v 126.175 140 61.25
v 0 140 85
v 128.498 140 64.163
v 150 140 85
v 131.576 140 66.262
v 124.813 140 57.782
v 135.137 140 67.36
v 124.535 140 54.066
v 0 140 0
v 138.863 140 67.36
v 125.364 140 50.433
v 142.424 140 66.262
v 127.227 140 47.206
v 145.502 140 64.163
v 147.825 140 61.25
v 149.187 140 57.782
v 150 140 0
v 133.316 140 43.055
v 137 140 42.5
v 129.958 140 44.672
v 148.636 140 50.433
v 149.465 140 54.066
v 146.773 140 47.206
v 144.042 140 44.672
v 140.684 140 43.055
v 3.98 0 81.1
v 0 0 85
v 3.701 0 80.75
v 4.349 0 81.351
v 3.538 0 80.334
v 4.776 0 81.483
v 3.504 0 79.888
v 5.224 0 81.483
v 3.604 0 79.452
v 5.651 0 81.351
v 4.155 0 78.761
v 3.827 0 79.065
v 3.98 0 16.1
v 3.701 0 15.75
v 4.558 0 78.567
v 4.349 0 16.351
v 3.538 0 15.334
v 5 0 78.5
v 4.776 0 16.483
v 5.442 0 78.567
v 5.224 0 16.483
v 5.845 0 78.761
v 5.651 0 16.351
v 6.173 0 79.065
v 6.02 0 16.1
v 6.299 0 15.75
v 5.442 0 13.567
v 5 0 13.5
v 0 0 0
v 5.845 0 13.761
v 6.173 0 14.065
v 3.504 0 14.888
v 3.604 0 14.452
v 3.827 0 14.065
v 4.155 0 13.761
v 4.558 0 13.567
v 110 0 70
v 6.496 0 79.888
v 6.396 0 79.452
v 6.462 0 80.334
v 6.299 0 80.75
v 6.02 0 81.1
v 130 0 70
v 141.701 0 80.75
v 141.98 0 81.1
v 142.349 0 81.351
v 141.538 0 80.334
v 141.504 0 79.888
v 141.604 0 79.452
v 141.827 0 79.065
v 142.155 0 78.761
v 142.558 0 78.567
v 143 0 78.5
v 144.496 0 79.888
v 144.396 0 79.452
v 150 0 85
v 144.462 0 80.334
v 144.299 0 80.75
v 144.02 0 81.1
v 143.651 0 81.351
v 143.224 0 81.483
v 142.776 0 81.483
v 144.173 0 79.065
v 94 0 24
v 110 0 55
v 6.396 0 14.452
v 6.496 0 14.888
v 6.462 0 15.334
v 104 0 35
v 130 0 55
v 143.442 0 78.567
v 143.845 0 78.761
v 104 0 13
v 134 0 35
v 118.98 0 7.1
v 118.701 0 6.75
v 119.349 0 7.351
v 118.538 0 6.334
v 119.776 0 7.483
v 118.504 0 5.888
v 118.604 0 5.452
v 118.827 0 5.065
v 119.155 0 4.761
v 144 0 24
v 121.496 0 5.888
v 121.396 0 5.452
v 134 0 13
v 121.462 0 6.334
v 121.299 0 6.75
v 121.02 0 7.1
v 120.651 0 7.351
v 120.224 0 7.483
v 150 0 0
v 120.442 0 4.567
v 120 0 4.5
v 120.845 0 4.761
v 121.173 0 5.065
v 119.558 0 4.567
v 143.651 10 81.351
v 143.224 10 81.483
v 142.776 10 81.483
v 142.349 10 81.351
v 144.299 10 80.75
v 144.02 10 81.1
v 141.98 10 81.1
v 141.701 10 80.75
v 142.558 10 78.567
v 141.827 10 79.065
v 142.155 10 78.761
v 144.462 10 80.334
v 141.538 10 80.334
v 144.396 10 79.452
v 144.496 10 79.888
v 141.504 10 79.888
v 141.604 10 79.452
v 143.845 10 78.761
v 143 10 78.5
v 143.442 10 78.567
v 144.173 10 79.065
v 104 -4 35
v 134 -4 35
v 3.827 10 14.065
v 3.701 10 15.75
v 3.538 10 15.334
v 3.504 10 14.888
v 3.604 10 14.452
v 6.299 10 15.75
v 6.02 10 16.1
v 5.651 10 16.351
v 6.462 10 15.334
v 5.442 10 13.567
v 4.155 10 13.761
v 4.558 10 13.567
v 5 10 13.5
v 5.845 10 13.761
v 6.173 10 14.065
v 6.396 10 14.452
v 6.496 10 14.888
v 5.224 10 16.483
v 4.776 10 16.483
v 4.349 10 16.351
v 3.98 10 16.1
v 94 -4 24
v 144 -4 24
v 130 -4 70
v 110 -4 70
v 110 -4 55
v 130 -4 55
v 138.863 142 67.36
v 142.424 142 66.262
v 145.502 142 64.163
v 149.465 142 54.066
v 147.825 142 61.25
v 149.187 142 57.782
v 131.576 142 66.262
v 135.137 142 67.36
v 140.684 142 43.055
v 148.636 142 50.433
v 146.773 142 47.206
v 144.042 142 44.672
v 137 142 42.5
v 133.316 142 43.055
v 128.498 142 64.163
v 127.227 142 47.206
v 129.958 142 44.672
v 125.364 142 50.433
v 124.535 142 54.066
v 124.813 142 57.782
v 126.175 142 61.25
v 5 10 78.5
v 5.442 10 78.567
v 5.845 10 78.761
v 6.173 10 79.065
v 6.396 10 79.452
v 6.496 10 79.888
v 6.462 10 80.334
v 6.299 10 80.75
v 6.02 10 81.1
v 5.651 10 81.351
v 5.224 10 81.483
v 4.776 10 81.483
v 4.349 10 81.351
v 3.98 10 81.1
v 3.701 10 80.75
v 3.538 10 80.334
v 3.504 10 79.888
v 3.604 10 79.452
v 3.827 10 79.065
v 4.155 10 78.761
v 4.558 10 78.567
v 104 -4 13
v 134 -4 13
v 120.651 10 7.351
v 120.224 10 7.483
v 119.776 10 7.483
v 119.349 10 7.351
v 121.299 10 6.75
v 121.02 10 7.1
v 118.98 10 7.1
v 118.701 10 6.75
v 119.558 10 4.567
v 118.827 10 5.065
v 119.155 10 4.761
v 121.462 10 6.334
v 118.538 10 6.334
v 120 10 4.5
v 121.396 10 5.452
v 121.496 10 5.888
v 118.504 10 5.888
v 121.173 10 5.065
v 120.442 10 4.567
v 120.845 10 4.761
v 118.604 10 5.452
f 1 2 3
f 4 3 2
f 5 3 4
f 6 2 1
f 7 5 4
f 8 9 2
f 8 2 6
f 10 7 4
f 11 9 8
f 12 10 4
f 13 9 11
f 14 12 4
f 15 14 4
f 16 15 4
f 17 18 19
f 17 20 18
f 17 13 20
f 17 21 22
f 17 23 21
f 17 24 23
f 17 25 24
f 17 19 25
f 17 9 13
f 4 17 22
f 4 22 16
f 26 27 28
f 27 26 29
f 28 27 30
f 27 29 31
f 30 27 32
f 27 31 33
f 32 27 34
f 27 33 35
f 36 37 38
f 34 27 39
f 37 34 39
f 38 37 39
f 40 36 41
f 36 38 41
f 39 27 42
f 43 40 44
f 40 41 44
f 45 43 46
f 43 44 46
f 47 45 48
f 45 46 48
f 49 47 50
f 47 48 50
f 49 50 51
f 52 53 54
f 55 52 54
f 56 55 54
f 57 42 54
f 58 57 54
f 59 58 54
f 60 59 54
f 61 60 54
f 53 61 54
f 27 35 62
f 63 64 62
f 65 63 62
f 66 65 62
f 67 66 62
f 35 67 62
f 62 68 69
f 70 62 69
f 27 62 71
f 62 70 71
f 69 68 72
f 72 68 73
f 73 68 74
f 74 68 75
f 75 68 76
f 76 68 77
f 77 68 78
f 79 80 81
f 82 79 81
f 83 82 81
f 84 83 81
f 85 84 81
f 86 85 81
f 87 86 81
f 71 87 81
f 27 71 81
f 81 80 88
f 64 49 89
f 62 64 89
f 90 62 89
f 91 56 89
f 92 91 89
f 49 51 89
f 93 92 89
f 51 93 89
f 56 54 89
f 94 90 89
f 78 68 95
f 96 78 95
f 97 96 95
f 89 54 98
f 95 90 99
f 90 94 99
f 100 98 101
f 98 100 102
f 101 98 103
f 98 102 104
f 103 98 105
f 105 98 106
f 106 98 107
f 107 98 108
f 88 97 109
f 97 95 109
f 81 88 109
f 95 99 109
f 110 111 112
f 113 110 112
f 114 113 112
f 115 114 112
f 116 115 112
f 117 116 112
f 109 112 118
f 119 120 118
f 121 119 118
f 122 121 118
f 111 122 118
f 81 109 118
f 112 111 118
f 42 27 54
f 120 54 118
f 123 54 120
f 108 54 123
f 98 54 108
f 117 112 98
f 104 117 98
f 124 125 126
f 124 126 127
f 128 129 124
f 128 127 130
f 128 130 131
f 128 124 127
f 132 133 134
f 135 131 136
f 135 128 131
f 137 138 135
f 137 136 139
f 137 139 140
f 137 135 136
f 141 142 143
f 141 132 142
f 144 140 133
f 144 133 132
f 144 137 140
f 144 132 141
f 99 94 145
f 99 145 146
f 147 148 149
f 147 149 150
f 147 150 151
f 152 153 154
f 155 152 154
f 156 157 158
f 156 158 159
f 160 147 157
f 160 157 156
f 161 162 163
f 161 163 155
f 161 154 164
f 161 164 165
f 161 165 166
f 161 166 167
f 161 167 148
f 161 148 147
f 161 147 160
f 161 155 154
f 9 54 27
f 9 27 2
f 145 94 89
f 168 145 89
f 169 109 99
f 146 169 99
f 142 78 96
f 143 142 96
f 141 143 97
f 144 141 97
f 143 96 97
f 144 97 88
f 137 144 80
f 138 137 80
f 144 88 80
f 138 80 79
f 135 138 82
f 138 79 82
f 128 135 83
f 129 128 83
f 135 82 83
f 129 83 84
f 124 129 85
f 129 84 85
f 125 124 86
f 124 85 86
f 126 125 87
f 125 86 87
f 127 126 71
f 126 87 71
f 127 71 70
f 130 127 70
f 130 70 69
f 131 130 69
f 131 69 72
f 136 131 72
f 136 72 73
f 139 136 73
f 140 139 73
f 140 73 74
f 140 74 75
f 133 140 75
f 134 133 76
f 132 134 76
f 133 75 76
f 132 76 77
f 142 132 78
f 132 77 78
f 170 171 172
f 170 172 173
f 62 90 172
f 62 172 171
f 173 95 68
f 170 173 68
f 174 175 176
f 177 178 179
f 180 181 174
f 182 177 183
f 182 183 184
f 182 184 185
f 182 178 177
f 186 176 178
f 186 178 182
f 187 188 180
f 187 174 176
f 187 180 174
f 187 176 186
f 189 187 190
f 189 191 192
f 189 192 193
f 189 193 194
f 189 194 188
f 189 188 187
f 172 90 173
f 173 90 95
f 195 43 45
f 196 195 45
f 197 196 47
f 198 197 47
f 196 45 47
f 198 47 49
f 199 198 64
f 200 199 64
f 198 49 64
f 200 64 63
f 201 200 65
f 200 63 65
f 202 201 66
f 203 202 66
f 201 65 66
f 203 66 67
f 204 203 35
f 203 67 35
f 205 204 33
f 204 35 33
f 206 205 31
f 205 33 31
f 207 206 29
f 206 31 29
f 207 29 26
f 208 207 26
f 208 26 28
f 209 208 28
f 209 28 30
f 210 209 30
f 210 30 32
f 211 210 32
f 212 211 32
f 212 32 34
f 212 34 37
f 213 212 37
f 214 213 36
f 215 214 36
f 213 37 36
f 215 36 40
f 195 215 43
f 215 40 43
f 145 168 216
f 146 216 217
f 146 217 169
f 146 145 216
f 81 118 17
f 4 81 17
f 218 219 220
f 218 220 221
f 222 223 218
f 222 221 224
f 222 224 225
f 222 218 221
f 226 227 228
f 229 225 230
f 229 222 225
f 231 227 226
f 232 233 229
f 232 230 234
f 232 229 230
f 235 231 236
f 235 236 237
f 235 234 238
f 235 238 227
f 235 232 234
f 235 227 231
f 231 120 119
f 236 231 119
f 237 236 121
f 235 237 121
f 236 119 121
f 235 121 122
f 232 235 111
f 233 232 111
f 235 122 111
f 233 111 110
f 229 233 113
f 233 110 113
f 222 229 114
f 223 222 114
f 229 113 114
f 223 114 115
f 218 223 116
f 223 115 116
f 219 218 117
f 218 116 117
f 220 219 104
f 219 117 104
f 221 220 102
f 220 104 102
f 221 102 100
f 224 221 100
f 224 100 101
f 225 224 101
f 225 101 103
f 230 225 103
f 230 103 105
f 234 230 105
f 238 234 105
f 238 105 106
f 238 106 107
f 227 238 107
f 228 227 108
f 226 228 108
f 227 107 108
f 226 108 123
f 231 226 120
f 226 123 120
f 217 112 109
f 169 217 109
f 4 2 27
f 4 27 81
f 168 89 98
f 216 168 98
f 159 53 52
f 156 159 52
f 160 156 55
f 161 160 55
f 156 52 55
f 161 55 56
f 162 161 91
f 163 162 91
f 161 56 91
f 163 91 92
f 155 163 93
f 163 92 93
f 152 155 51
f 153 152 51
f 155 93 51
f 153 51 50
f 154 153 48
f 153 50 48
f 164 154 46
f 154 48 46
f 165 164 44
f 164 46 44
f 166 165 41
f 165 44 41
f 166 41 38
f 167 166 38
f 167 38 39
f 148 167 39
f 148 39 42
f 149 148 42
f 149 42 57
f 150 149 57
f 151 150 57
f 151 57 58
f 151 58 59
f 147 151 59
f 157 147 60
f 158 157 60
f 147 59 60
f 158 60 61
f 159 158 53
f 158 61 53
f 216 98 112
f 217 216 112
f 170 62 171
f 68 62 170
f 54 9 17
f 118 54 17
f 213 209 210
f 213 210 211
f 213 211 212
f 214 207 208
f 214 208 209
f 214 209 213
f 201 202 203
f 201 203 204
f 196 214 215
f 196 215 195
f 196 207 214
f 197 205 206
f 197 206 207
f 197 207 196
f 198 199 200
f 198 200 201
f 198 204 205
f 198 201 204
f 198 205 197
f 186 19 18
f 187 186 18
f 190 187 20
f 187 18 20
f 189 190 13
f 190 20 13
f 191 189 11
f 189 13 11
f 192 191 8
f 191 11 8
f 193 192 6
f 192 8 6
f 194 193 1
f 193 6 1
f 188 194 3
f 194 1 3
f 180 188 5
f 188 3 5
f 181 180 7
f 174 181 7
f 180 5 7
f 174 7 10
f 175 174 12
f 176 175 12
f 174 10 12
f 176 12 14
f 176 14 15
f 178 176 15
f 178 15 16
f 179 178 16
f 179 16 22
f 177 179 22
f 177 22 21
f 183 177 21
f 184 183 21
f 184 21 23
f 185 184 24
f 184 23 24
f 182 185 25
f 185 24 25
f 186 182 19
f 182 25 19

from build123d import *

# Parameters (mm, degrees)
SCHIZZO1_W                   = 150
SCHIZZO1_H                   = 140
ESTRUSIONE_ESTRUSIONE1_DEPTH = 85
SCHIZZO2_W                   = 20
SCHIZZO2_H                   = 15
SCHIZZO2_W_2                 = 30
SCHIZZO2_H_2                 = 11
ESTRUSIONE_ESTRUSIONE2_DEPTH = 4
SCHIZZO3_R                   = 1.5
TAGLIO_ESTRUSIONE1_DEPTH     = 10
SCHIZZO4_R                   = 12.5
ESTRUSIONE_ESTRUSIONE3_DEPTH = 2


with BuildPart() as part:
    # Schizzo1 → Estrusione-Estrusione1 (new body)
    with BuildSketch(Plane.XY):
        with Locations((75, 70)):
            Rectangle(SCHIZZO1_W, SCHIZZO1_H)
    extrude(amount=ESTRUSIONE_ESTRUSIONE1_DEPTH)

    # Schizzo2 → Estrusione-Estrusione2 (add)
    with BuildSketch(Plane.XZ):
        with Locations((120, 62.5)):
            Rectangle(SCHIZZO2_W, SCHIZZO2_H)
        Polygon((104, 35), (94, 24), (104, 24), align=None)
        Polygon((94, 24), (104, 13), (104, 24), align=None)
        with Locations((119, 29.5)):
            Rectangle(SCHIZZO2_W_2, SCHIZZO2_H_2)
        with Locations((119, 18.5)):
            Rectangle(SCHIZZO2_W_2, SCHIZZO2_H_2)
        Polygon((134, 35), (134, 24), (144, 24), align=None)
        Polygon((134, 24), (134, 13), (144, 24), align=None)
    extrude(amount=ESTRUSIONE_ESTRUSIONE2_DEPTH)

    # Schizzo3 → Taglio-Estrusione1 (cut)
    with BuildSketch(Plane.XZ):
        with Locations(Location((5, 80, 0), (0, 0, 270))):
            Circle(SCHIZZO3_R)
        with Locations(Location((5, 15, 0), (0, 0, 270))):
            Circle(SCHIZZO3_R)
        with Locations(Location((120, 6, 0), (0, 0, 270))):
            Circle(SCHIZZO3_R)
        with Locations(Location((143, 80, 0), (0, 0, 270))):
            Circle(SCHIZZO3_R)
    extrude(amount=-TAGLIO_ESTRUSIONE1_DEPTH, mode=Mode.SUBTRACT)

    # Schizzo4 → Estrusione-Estrusione3 (add)
    with BuildSketch(Plane(origin=(0, 140, 0), x_dir=(1, 0, 0), z_dir=(0, 1, 0))):
        with Locations(Location((137, -55, 0), (0, 0, 90))):
            Circle(SCHIZZO4_R)
    extrude(amount=ESTRUSIONE_ESTRUSIONE3_DEPTH)


solid = part.part
